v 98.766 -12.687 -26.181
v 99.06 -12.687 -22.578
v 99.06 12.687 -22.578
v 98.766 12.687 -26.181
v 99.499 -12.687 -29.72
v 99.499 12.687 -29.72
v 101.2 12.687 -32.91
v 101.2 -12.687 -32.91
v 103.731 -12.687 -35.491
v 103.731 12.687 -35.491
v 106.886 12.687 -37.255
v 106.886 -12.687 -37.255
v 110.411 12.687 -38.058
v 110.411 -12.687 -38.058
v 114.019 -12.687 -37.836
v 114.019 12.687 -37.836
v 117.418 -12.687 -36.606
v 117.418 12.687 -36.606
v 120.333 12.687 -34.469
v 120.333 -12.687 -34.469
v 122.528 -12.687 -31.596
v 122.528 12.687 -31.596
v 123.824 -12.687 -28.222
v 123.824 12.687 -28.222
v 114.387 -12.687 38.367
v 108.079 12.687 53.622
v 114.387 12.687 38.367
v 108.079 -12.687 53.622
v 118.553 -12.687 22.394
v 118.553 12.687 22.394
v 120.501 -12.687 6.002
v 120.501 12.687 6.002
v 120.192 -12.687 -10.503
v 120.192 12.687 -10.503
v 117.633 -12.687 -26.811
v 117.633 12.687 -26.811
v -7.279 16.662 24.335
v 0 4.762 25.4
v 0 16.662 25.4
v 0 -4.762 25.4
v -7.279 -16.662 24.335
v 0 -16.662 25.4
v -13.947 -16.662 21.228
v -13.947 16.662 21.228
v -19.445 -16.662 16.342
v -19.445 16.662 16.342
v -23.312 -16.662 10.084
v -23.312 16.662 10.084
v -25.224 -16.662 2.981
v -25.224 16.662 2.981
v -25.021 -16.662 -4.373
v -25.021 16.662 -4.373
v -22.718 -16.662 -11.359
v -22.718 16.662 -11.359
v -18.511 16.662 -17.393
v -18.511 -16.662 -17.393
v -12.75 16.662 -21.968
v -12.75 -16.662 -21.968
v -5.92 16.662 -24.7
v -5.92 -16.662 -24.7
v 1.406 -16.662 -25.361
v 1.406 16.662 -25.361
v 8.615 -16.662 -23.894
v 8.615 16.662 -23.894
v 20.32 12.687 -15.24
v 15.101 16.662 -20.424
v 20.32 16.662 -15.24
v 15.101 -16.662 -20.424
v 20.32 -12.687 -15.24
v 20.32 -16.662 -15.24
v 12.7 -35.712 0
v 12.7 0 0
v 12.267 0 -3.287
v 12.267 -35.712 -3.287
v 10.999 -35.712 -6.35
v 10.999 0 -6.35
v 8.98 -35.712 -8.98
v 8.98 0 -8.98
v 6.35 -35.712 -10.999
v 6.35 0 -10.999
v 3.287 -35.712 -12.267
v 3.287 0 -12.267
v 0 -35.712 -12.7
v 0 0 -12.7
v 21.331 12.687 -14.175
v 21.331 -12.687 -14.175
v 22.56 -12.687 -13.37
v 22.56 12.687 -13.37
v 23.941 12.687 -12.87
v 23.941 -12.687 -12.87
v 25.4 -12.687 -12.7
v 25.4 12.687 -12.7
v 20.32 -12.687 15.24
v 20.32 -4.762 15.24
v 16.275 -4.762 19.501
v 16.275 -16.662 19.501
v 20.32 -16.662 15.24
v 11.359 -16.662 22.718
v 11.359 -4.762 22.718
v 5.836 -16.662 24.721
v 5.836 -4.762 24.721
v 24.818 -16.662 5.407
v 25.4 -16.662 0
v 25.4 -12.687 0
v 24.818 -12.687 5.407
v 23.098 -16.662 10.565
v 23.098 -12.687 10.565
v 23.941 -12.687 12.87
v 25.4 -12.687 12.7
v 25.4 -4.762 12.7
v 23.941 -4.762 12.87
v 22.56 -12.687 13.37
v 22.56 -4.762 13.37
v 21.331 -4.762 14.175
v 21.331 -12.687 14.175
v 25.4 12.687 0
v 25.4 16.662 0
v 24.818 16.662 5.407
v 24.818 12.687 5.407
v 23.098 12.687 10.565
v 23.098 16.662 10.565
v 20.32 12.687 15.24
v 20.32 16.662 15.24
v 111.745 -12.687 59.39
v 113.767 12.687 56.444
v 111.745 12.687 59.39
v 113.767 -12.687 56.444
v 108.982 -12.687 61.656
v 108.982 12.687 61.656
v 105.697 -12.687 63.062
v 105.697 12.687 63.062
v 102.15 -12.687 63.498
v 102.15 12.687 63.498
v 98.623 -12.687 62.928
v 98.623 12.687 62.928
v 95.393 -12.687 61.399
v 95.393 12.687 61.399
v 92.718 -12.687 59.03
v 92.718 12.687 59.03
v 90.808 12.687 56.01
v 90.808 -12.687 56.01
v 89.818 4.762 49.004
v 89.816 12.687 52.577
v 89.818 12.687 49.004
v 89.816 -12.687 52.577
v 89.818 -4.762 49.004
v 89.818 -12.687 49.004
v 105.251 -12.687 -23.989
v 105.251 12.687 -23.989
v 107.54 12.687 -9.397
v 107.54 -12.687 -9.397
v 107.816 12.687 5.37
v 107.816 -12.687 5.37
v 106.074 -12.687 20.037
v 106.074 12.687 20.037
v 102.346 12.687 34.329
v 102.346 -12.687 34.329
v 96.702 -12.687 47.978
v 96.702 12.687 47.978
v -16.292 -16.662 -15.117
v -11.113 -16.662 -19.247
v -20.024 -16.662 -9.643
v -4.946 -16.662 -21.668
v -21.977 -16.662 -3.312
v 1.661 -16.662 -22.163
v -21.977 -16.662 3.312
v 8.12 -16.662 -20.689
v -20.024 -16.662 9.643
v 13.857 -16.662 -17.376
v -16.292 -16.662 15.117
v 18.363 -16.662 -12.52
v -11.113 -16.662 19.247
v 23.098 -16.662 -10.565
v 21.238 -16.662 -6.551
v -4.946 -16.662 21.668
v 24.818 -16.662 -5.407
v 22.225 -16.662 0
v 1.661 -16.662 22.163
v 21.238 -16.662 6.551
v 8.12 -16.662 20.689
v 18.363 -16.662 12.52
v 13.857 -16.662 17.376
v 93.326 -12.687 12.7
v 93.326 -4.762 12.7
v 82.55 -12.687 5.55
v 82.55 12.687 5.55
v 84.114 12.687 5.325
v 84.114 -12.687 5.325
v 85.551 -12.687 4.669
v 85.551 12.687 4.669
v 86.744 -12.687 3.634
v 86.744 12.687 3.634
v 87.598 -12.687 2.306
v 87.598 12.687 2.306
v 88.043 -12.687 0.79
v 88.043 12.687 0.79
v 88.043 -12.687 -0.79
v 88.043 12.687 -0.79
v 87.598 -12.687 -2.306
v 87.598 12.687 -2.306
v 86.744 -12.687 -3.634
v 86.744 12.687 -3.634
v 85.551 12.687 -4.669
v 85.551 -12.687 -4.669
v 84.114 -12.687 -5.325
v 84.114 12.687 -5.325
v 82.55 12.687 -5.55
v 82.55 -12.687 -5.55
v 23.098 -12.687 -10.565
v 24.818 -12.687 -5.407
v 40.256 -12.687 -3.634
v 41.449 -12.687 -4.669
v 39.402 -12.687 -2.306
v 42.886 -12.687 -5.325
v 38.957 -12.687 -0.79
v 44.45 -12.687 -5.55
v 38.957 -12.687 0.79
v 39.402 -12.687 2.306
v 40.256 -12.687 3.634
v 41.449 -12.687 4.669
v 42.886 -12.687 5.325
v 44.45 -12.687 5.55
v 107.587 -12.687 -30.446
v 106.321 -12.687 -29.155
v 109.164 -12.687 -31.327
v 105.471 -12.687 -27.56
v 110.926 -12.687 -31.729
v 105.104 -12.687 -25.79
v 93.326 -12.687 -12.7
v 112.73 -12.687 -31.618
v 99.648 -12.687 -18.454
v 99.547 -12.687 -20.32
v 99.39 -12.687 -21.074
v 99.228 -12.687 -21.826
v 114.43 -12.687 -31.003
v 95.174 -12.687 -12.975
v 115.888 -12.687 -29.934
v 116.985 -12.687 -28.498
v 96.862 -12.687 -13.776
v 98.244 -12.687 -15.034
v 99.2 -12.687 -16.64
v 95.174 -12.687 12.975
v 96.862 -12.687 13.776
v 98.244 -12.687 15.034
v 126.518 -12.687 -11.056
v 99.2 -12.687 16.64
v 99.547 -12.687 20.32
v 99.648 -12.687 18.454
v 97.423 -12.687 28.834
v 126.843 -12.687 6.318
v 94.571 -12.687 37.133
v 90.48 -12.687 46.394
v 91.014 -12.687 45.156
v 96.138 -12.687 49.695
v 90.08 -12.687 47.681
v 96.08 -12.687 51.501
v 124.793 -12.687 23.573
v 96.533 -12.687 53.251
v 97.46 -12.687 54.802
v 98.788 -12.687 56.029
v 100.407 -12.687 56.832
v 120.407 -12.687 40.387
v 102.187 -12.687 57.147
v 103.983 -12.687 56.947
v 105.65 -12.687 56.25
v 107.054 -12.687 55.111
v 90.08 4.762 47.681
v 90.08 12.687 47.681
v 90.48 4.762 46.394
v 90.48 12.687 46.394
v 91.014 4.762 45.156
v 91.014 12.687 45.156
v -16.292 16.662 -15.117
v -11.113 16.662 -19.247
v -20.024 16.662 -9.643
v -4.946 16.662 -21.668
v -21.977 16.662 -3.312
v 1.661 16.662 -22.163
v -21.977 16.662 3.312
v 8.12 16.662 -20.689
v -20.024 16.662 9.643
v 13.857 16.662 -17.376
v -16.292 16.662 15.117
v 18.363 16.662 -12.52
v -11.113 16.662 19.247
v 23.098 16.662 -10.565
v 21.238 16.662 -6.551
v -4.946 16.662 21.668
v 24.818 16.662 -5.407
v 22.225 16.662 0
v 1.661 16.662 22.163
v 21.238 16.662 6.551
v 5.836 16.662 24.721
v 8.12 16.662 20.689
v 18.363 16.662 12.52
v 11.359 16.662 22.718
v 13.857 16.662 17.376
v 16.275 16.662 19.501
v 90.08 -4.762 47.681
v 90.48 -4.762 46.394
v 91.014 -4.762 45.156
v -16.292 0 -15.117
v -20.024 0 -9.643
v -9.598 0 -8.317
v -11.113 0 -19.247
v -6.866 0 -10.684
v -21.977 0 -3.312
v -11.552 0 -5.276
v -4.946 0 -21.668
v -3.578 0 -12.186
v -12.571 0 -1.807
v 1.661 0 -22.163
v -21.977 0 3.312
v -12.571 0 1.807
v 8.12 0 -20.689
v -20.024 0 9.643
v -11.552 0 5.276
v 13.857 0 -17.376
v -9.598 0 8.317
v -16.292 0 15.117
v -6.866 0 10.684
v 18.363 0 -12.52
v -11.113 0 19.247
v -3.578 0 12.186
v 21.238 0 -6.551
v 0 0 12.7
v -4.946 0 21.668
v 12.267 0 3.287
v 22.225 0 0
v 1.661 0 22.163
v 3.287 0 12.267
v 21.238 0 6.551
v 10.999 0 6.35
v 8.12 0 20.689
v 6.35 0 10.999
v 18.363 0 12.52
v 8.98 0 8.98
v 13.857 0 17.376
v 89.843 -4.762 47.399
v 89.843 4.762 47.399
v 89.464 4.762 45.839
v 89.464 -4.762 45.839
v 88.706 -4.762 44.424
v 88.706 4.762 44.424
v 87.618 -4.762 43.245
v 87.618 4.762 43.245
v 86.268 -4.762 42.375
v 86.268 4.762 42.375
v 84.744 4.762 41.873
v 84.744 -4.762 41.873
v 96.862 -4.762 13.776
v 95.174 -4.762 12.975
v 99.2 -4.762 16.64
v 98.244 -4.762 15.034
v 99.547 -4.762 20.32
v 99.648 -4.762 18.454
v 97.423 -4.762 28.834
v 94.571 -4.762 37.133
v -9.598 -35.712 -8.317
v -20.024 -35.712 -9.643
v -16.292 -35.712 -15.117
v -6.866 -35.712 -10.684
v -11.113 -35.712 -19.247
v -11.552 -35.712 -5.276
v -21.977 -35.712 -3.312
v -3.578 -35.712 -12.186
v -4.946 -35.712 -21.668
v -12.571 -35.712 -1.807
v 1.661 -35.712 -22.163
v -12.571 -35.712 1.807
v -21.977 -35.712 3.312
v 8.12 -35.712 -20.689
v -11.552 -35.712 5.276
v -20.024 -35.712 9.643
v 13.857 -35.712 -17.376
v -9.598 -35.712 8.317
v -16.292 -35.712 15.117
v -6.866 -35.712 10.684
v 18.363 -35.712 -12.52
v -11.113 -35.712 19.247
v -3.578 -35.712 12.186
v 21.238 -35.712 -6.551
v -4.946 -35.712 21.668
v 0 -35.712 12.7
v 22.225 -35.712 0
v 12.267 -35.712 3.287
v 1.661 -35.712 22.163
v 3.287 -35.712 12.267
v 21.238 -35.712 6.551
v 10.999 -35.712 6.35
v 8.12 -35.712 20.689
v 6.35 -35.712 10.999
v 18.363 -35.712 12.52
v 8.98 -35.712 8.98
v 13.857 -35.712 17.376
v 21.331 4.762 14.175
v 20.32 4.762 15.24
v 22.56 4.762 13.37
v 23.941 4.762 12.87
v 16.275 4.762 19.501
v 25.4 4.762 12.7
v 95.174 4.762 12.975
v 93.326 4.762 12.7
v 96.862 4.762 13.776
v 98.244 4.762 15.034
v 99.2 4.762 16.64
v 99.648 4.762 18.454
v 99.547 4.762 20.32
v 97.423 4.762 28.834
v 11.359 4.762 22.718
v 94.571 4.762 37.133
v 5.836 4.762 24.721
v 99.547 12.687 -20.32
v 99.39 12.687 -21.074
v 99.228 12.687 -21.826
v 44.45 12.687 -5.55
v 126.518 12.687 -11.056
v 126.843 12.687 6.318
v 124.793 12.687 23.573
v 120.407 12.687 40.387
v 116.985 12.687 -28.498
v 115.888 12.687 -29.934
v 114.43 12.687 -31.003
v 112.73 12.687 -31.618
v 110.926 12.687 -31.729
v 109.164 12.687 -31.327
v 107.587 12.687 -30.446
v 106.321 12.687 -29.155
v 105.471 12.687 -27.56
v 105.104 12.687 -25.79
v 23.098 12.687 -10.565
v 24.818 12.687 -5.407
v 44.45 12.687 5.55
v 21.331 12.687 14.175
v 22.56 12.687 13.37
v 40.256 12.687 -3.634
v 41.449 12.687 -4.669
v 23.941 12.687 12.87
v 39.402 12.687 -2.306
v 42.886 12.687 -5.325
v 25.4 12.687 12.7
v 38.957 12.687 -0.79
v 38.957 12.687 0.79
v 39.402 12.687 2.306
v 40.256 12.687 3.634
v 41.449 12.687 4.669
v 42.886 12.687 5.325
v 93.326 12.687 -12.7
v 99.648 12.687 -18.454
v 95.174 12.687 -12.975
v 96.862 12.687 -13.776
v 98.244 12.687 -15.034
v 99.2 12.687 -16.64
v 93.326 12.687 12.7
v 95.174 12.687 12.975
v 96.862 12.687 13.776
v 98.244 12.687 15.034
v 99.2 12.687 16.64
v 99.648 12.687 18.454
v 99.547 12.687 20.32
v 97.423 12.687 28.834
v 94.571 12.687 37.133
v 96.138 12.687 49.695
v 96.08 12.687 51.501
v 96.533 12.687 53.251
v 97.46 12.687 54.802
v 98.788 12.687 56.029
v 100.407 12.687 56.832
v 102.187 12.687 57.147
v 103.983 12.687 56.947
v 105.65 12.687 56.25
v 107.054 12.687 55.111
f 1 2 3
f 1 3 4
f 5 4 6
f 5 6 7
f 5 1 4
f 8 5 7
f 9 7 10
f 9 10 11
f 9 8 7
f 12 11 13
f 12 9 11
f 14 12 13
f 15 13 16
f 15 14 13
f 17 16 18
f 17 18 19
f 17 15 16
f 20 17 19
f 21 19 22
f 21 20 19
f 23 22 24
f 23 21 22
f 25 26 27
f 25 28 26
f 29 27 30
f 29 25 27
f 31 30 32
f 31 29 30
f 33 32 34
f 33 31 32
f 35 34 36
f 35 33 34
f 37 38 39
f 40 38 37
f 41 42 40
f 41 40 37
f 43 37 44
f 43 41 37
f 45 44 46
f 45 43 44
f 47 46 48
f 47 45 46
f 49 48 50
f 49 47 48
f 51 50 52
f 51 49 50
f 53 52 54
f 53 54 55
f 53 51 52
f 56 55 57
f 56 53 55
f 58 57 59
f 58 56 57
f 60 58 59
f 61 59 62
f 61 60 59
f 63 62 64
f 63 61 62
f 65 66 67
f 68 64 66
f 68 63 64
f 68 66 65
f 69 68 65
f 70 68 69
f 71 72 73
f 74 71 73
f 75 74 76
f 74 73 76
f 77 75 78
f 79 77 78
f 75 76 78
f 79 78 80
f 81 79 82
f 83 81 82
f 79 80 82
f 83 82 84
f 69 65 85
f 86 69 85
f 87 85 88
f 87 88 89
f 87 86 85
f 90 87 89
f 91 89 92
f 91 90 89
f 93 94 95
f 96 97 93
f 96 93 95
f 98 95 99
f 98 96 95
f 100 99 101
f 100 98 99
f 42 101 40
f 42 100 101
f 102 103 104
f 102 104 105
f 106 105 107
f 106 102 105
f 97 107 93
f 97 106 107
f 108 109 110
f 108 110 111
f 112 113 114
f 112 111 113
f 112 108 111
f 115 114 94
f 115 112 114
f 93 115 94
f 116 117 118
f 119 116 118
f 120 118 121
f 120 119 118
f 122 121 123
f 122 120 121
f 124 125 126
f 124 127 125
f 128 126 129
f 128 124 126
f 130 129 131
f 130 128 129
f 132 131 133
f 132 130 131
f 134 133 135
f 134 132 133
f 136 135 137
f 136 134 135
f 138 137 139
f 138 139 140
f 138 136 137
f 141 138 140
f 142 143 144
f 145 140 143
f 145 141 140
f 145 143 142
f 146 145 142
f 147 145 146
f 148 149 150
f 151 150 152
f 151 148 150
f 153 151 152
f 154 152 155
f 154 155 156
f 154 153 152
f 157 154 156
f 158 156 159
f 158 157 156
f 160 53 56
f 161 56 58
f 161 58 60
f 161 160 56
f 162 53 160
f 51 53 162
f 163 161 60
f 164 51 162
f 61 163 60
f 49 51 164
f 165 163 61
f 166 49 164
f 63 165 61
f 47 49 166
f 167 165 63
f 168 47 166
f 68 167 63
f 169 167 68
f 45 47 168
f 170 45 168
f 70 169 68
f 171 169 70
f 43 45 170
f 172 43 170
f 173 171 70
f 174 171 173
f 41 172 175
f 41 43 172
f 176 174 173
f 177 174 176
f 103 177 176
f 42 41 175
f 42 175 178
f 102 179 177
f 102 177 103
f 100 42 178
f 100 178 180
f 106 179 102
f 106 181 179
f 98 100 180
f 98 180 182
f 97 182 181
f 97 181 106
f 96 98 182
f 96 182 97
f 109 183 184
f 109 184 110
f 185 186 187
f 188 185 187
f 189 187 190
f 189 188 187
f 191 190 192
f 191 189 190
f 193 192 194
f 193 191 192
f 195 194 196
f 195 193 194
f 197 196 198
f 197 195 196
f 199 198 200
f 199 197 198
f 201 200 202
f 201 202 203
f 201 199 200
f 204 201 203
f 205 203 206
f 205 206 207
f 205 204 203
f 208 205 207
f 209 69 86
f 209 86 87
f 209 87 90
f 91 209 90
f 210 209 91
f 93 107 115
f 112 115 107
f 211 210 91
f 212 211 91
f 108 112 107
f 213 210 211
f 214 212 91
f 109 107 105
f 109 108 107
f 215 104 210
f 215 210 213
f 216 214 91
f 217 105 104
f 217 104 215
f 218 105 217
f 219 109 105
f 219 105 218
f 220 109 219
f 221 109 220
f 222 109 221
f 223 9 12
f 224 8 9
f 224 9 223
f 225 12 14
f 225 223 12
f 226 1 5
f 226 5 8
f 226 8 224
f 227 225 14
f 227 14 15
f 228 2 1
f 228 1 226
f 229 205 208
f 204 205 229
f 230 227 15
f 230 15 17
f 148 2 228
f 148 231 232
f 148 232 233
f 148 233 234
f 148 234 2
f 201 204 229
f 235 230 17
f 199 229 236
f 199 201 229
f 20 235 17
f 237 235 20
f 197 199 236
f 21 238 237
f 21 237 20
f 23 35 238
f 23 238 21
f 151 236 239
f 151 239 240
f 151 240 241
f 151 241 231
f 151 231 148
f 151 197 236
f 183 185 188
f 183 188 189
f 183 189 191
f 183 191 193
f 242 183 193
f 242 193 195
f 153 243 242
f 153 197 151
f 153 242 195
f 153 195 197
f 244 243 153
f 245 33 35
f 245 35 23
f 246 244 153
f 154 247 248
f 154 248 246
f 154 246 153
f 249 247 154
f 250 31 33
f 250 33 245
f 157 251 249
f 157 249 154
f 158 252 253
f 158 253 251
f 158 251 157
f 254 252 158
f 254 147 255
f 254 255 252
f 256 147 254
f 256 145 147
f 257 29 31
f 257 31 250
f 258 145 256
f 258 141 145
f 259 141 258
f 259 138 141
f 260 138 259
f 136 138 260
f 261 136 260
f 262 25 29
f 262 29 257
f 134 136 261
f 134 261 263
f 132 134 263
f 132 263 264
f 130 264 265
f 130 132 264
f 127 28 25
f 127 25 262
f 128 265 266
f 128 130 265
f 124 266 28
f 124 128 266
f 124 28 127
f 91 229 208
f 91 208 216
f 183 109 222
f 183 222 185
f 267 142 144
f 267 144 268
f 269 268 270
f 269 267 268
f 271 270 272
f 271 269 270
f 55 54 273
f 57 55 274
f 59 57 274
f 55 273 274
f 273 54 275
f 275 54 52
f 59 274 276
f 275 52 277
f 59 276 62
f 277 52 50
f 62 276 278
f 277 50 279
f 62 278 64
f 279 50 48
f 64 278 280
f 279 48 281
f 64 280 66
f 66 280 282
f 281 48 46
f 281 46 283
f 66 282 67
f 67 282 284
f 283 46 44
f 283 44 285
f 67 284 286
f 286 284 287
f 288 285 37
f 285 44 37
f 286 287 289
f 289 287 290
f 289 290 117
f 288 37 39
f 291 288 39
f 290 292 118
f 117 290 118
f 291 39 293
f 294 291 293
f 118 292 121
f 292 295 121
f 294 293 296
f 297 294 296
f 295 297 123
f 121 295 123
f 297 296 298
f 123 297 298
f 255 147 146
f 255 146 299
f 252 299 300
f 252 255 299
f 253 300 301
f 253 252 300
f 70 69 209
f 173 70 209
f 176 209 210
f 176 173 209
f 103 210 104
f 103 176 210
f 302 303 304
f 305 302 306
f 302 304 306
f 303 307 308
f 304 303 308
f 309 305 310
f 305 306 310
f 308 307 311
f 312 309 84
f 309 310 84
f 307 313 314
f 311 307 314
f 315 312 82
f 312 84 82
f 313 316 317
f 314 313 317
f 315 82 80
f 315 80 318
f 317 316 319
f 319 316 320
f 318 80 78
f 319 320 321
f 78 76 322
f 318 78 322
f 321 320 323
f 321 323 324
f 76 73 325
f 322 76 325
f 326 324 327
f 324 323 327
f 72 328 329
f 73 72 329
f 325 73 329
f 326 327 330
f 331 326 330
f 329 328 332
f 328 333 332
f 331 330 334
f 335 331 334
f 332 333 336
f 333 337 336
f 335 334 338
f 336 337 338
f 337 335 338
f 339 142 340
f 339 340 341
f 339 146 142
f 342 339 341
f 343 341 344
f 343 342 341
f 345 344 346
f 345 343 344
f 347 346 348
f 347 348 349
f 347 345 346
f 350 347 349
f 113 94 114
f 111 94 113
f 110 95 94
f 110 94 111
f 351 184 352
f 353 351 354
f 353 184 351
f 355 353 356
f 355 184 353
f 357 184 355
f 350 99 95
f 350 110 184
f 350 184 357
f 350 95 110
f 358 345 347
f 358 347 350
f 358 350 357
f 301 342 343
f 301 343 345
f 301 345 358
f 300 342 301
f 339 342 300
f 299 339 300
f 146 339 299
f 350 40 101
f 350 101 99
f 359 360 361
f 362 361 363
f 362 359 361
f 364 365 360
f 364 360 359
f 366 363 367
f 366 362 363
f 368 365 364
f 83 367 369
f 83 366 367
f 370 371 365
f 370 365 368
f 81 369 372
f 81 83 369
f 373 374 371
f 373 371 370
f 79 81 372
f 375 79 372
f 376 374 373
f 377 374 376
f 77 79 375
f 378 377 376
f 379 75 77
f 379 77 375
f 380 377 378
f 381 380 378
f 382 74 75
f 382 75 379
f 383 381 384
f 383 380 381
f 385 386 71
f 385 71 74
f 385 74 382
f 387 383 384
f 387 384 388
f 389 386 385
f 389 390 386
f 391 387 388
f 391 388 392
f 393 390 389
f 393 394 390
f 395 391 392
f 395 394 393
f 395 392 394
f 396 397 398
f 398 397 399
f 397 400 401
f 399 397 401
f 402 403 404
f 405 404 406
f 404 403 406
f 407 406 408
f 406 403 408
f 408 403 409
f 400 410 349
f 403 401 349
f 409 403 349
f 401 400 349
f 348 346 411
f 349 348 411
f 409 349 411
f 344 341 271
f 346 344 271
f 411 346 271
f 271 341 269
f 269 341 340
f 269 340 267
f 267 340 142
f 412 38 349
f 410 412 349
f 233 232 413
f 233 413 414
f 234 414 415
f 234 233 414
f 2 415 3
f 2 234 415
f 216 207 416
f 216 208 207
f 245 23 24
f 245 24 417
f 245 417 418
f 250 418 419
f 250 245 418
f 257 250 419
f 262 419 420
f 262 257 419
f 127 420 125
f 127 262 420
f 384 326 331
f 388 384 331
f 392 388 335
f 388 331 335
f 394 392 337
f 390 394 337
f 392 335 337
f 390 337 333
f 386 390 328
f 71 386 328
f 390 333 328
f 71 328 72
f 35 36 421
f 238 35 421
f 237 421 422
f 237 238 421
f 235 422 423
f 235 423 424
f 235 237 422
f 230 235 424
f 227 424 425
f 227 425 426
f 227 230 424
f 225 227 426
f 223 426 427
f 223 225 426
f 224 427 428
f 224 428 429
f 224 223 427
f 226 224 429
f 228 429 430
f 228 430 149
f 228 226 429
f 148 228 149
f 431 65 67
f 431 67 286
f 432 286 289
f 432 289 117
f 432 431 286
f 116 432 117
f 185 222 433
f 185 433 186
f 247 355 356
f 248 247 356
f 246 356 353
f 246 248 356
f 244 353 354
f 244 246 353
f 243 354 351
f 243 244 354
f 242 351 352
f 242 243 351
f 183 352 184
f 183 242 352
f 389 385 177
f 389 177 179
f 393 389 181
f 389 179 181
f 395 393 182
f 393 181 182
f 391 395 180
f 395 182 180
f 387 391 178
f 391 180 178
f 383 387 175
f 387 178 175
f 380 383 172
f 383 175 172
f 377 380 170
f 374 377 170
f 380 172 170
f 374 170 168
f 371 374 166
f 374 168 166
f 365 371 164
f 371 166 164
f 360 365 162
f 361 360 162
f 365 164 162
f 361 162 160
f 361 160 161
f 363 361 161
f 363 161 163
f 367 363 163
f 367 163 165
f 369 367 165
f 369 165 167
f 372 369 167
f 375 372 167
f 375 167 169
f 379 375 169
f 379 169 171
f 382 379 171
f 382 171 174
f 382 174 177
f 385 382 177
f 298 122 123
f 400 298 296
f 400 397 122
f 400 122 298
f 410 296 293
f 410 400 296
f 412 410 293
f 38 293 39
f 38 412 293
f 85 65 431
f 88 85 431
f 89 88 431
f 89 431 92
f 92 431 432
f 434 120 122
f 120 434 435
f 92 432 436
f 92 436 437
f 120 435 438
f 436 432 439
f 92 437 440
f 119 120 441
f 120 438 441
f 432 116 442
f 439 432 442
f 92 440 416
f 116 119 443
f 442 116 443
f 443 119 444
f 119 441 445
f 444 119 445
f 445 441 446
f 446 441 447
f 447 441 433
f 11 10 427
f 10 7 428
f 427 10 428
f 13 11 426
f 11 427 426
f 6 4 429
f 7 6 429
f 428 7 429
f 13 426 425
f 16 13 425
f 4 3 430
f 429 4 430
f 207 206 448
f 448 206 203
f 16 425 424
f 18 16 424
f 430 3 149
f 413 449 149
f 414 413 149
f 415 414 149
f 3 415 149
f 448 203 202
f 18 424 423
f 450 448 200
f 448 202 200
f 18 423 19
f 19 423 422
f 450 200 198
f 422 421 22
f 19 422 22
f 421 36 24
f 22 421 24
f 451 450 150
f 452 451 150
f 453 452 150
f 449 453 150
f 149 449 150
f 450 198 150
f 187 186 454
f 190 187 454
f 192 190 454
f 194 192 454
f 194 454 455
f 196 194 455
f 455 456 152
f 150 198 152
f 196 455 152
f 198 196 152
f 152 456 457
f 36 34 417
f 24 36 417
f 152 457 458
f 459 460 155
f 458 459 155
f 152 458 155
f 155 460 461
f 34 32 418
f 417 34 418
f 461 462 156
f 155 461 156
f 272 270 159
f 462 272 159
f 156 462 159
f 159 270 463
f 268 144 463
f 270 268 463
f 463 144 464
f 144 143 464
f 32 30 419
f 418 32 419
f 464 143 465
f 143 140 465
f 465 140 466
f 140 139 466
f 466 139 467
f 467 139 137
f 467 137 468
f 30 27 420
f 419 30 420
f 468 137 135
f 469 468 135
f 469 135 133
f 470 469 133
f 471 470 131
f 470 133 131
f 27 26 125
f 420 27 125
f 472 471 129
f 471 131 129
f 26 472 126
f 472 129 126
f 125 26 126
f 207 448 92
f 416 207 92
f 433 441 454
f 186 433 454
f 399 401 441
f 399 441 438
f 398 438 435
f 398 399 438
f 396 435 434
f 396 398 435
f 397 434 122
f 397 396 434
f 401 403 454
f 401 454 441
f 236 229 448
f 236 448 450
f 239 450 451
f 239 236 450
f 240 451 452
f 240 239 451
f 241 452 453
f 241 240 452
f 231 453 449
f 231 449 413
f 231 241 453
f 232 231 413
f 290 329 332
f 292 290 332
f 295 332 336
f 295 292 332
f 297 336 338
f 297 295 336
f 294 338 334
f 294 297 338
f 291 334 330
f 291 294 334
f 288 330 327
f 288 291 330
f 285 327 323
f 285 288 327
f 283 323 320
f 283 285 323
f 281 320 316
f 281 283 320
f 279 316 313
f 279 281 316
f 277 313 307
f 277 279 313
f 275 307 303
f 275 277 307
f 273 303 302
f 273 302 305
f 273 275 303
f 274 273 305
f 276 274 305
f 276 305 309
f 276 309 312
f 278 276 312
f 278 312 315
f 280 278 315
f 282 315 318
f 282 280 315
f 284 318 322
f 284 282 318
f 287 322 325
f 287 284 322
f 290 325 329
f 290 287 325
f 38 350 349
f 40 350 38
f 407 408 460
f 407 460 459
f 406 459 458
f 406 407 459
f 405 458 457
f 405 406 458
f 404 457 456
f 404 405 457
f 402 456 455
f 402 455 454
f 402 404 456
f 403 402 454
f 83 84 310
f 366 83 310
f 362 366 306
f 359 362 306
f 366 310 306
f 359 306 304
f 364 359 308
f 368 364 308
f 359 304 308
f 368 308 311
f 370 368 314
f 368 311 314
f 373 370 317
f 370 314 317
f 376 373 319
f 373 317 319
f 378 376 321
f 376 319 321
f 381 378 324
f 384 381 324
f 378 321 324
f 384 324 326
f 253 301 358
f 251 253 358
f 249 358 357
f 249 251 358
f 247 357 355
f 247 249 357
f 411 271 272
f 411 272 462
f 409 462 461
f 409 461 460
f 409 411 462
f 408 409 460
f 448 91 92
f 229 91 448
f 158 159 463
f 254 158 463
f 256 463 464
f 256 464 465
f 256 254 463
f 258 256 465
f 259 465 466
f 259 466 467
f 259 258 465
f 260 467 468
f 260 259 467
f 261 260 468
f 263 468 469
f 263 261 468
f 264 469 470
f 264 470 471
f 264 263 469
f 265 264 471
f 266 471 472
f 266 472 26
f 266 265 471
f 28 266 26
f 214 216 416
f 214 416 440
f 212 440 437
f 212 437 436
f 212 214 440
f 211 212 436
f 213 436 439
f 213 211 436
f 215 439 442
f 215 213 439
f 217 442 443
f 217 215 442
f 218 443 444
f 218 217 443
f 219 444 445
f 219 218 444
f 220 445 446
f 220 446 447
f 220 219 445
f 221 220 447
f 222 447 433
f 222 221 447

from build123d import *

# Parameters (mm, degrees)
F0_R     = 22.225
F1_DEPTH = 35.7124
F2_DEPTH = 16.6624
F3_DEPTH = 4.7625
F4_DEPTH = 12.6873


with BuildPart() as f1:
    # F0 (on Front) → F1 (new body)
    with BuildSketch(Plane.XZ):
        Circle(F0_R)
        with BuildLine():
            ThreePointArc((0, 12.7), (8.980256, 8.980256), (12.7, 0))
            ThreePointArc((12.7, 0), (8.980256, -8.980256), (0, -12.7))
            ThreePointArc((0, -12.7), (-12.7, 0), (0, 12.7))
        make_face(mode=Mode.SUBTRACT)
    extrude(amount=F1_DEPTH)

    # F0 (on Front) → F2 (join, symmetric)
    with BuildSketch(Plane.XZ):
        with BuildLine():
            ThreePointArc((20.32, -15.24), (24.096556, -8.032185), (25.4, 0))
            ThreePointArc((25.4, 0), (24.096556, 8.032185), (20.32, 15.24))
            ThreePointArc((20.32, 15.24), (11.359225, 22.718451), (0, 25.4))
            ThreePointArc((0, 25.4), (-22.718451, -11.359225), (20.32, -15.24))
        make_face()
        Circle(F0_R, mode=Mode.SUBTRACT)
    extrude(amount=F2_DEPTH, both=True)

    # F0 (on Front) → F3 (join, symmetric)
    with BuildSketch(Plane.XZ):
        with BuildLine():
            ThreePointArc((0, 25.4), (11.359225, 22.718451), (20.32, 15.24))
            ThreePointArc((20.32, 15.24), (22.560194, 13.370387), (25.4, 12.7))
            Line((25.4, 12.7), (93.325559, 12.7))
            ThreePointArc((93.325559, 12.7), (98.244248, 15.033907), (99.547263, 20.32))
            ThreePointArc((99.547263, 20.32), (96.086385, 33.014641), (91.013932, 45.155556))
            ThreePointArc((91.013932, 45.155556), (90.262515, 47.032005), (89.818321, 49.003903))
            ThreePointArc((89.818321, 49.003903), (88.705969, 44.424273), (84.743782, 41.872523))
            Line((84.743782, 41.872523), (0, 25.4))
        make_face()
    extrude(amount=F3_DEPTH, both=True)

    # F0 (on Front) → F4 (join, symmetric)
    with BuildSketch(Plane.XZ):
        with BuildLine():
            ThreePointArc((20.32, 15.24), (24.096556, 8.032185), (25.4, 0))
            ThreePointArc((25.4, 0), (24.096556, -8.032185), (20.32, -15.24))
            ThreePointArc((20.32, -15.24), (22.560194, -13.370387), (25.4, -12.7))
            Line((25.4, -12.7), (93.325559, -12.7))
            ThreePointArc((93.325559, -12.7), (98.244248, -15.033907), (99.547263, -20.32))
            ThreePointArc((99.547263, -20.32), (99.309847, -21.450275), (99.059598, -22.577778))
            ThreePointArc((99.059598, -22.577778), (108.619825, -37.78245), (123.824497, -28.222222))
            ThreePointArc((123.824497, -28.222222), (126.113403, 14.98031), (113.767415, 56.444444))
            ThreePointArc((113.767415, 56.444444), (98.622679, 62.928158), (89.818321, 49.003903))
            ThreePointArc((89.818321, 49.003903), (90.262515, 47.032005), (91.013932, 45.155556))
            ThreePointArc((91.013932, 45.155556), (96.086385, 33.014641), (99.547263, 20.32))
            ThreePointArc((99.547263, 20.32), (98.244248, 15.033907), (93.325559, 12.7))
            Line((93.325559, 12.7), (25.4, 12.7))
            ThreePointArc((25.4, 12.7), (22.560194, 13.370387), (20.32, 15.24))
        make_face()
        with BuildLine():
            ThreePointArc((44.45, -5.5499), (38.9001, 0), (44.45, 5.5499))
            Line((44.45, 5.5499), (82.55, 5.5499))
            ThreePointArc((82.55, 5.5499), (88.0999, 0), (82.55, -5.5499))
            Line((82.55, -5.5499), (44.45, -5.5499))
        make_face(mode=Mode.SUBTRACT)
        with BuildLine():
            ThreePointArc((96.702303, 47.977778), (99.568451, 56.488371), (108.079044, 53.622222))
            ThreePointArc((108.079044, 53.622222), (119.807732, 14.231294), (117.633273, -26.811111))
            ThreePointArc((117.633273, -26.811111), (110.030937, -31.591225), (105.250823, -23.988889))
            ThreePointArc((105.250823, -23.988889), (107.196392, 12.733263), (96.702303, 47.977778))
        make_face(mode=Mode.SUBTRACT)
    extrude(amount=F4_DEPTH, both=True)


solid = f1.part
